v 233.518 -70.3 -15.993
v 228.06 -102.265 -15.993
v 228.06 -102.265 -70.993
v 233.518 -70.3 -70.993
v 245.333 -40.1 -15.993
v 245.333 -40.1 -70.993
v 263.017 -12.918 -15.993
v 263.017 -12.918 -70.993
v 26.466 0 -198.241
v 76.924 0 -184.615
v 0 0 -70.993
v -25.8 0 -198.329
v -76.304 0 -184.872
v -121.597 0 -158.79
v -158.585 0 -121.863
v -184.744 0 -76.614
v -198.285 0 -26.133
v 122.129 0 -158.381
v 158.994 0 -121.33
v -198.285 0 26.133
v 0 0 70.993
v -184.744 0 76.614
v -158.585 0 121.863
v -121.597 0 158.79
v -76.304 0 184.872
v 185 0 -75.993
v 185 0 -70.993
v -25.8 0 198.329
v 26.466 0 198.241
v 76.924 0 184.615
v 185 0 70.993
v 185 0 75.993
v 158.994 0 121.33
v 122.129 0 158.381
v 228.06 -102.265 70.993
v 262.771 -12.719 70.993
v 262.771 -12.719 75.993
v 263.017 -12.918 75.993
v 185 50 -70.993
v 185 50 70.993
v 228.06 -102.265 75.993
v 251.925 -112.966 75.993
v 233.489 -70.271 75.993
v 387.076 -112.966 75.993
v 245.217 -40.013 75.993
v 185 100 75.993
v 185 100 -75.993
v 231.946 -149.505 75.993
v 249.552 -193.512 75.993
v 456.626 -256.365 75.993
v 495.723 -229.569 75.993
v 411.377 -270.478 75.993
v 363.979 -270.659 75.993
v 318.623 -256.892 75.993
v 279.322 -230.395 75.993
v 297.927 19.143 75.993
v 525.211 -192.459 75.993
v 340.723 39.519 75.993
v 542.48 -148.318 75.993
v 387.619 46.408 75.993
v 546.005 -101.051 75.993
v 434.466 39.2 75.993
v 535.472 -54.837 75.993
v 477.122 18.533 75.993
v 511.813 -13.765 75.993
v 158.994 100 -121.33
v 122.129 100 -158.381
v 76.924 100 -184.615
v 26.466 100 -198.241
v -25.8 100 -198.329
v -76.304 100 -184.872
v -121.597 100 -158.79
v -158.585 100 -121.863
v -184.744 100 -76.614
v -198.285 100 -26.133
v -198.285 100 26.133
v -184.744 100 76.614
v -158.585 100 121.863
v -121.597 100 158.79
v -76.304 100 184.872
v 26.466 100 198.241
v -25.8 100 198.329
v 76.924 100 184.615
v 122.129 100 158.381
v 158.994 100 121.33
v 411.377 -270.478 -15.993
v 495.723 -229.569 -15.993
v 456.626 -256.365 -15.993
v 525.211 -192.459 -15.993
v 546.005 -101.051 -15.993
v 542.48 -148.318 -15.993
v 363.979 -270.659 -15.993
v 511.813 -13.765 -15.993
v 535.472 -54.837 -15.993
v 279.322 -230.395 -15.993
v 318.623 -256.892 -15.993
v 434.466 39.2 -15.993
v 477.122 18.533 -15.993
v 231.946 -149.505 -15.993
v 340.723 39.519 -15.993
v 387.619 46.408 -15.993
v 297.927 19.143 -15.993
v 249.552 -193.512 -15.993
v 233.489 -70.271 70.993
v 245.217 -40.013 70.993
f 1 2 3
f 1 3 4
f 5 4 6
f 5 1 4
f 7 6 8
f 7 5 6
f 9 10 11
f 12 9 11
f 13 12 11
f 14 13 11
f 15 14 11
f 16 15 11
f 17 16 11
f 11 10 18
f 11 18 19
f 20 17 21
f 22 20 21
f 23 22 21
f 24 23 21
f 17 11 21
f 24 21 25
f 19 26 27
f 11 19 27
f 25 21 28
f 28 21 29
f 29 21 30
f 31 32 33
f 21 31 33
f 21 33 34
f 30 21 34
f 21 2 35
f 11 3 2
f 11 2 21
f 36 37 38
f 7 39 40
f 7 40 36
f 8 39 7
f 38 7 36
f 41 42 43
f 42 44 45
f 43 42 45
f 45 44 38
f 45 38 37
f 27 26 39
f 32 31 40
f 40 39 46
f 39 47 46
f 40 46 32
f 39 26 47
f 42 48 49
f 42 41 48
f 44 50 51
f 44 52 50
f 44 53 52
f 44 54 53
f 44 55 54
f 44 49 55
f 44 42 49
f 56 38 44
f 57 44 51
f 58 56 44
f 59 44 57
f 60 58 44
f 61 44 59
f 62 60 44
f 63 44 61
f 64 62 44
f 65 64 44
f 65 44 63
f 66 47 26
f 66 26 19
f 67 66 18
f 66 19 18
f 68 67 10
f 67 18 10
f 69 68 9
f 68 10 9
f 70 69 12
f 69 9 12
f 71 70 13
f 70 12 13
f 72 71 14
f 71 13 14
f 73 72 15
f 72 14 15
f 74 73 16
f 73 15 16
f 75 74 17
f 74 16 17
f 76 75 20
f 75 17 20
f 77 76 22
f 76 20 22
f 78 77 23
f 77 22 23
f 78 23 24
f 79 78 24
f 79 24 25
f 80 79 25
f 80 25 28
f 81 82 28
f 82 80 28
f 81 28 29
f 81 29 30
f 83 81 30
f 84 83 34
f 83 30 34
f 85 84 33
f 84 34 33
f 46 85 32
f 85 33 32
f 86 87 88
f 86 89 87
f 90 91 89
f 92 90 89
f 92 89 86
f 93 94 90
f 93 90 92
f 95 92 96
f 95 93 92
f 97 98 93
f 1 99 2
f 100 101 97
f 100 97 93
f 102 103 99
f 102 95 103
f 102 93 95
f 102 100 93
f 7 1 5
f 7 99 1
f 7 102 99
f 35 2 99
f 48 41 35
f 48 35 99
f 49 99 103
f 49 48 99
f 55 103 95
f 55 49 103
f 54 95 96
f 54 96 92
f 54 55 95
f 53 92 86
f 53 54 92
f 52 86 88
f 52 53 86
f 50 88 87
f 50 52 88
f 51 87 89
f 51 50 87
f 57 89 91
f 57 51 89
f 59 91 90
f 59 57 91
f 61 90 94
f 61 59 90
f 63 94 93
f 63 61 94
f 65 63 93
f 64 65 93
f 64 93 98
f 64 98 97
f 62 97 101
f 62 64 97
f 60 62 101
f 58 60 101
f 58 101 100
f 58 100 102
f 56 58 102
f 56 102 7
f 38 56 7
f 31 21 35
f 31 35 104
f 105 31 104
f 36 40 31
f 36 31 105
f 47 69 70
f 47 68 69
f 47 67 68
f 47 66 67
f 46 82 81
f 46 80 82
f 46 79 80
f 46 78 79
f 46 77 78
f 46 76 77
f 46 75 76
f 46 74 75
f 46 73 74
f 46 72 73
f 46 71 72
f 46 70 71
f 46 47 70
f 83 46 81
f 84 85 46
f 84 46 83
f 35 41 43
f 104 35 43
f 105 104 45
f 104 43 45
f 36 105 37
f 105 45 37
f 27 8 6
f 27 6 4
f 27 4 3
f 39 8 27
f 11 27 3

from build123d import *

# Parameters (mm, degrees)
SKETCH1_R           = 200
BOSS_EXTRUDE1_DEPTH = 100
CUT_EXTRUDE2_DEPTH  = 100
BOSS_EXTRUDE2_DEPTH = 75.993421
BOSS_EXTRUDE3_DEPTH = 75.993421
SKETCH9_R           = 159.375
BOSS_EXTRUDE4_DEPTH = 151.986842
CUT_EXTRUDE3_START  = -60
SKETCH11_R          = 159.375
CUT_EXTRUDE3_DEPTH  = 60
CUT_EXTRUDE4_DEPTH  = 5
CUT_EXTRUDE5_DEPTH  = 5


with BuildPart() as part:
    # Sketch1 → Boss-Extrude1 (new body)
    with BuildSketch(Plane(origin=(0, 0, 0), x_dir=(1, 0, 0), z_dir=(0, 1, 0))):
        with Locations(Location((0, 0, 0), (0, 0, 270))):
            Circle(SKETCH1_R)
    extrude(amount=BOSS_EXTRUDE1_DEPTH)

    # Sketch2 → Cut-Extrude2 (cut)
    with BuildSketch(Plane(origin=(0, 100, 0), x_dir=(1, 0, 0), z_dir=(0, 1, 0))):
        Polygon((185, 0), (185, 120.642549135), (200, 120.642549135), (200, 0), (200, -137.849885779), (185, -137.849885779), align=None)
    extrude(amount=-CUT_EXTRUDE2_DEPTH, mode=Mode.SUBTRACT)

    # Sketch4 → Boss-Extrude2 (add)
    with BuildSketch(Plane.XY):
        Polygon((185, 50), (185, 0), (0, 0), (251.924557131, -112.966443103), (387.075695624, -112.966443103), align=None)
    extrude(amount=-BOSS_EXTRUDE2_DEPTH)

    # Sketch7 → Boss-Extrude3 (add)
    with BuildSketch(Plane.XY):
        Polygon((0, 0), (185, 0), (185, 50), (387.075695624, -112.966443103), (251.924557131, -112.966443103), align=None)
    extrude(amount=BOSS_EXTRUDE3_DEPTH)

    # Sketch9 → Boss-Extrude4 (add)
    with BuildSketch(Plane.XY.offset(75.993420768)):
        with Locations((387.075695624, -112.966443103)):
            Circle(SKETCH9_R)
    extrude(amount=-BOSS_EXTRUDE4_DEPTH)

    # Sketch11 → Cut-Extrude3 (cut)
    with BuildSketch(Plane(origin=(0, 0, -75.993420768), x_dir=(-1, 0, 0), z_dir=(0, 0, -1)).offset(CUT_EXTRUDE3_START)):
        with Locations((-387.075695624, -112.966443103)):
            Circle(SKETCH11_R)
    extrude(amount=CUT_EXTRUDE3_DEPTH, mode=Mode.SUBTRACT)


with BuildPart() as cut_extrude3_kept_piece:
    # of the separate pieces the step leaves, the one the design keeps (cut_extrude3_pieces_kept)
    add(part.part.solids().sort_by_distance((185, 0, -75.993420884))[0])

    # Sketch12 → Cut-Extrude4 (cut)
    with BuildSketch(Plane.XY.offset(75.993420768)):
        with BuildLine():
            Line((185, 0), (0, 0))
            Line((0, 0), (228.060355378, -102.265406172))
            ThreePointArc((228.060355378, -102.265406172), (238.589276077, -54.846272892), (262.770904395, -12.719307371))
            Line((262.770904395, -12.719307371), (185, 50))
            Line((185, 50), (185, 0))
        make_face()
    extrude(amount=-CUT_EXTRUDE4_DEPTH, mode=Mode.SUBTRACT)

    # Sketch14 → Cut-Extrude5 (cut)
    with BuildSketch(Plane(origin=(0, 0, -75.993420768), x_dir=(-1, 0, 0), z_dir=(0, 0, -1))):
        with BuildLine():
            Line((-228.060355378, -102.265406172), (0, 0))
            Line((0, 0), (-185, 0))
            Line((-185, 0), (-185, 50))
            Line((-185, 50), (-263.016769179, -12.917588066))
            ThreePointArc((-263.016769179, -12.917588066), (-238.655621962, -54.898617596), (-228.060355378, -102.265406172))
        make_face()
    extrude(amount=-CUT_EXTRUDE5_DEPTH, mode=Mode.SUBTRACT)


solid = cut_extrude3_kept_piece.part
